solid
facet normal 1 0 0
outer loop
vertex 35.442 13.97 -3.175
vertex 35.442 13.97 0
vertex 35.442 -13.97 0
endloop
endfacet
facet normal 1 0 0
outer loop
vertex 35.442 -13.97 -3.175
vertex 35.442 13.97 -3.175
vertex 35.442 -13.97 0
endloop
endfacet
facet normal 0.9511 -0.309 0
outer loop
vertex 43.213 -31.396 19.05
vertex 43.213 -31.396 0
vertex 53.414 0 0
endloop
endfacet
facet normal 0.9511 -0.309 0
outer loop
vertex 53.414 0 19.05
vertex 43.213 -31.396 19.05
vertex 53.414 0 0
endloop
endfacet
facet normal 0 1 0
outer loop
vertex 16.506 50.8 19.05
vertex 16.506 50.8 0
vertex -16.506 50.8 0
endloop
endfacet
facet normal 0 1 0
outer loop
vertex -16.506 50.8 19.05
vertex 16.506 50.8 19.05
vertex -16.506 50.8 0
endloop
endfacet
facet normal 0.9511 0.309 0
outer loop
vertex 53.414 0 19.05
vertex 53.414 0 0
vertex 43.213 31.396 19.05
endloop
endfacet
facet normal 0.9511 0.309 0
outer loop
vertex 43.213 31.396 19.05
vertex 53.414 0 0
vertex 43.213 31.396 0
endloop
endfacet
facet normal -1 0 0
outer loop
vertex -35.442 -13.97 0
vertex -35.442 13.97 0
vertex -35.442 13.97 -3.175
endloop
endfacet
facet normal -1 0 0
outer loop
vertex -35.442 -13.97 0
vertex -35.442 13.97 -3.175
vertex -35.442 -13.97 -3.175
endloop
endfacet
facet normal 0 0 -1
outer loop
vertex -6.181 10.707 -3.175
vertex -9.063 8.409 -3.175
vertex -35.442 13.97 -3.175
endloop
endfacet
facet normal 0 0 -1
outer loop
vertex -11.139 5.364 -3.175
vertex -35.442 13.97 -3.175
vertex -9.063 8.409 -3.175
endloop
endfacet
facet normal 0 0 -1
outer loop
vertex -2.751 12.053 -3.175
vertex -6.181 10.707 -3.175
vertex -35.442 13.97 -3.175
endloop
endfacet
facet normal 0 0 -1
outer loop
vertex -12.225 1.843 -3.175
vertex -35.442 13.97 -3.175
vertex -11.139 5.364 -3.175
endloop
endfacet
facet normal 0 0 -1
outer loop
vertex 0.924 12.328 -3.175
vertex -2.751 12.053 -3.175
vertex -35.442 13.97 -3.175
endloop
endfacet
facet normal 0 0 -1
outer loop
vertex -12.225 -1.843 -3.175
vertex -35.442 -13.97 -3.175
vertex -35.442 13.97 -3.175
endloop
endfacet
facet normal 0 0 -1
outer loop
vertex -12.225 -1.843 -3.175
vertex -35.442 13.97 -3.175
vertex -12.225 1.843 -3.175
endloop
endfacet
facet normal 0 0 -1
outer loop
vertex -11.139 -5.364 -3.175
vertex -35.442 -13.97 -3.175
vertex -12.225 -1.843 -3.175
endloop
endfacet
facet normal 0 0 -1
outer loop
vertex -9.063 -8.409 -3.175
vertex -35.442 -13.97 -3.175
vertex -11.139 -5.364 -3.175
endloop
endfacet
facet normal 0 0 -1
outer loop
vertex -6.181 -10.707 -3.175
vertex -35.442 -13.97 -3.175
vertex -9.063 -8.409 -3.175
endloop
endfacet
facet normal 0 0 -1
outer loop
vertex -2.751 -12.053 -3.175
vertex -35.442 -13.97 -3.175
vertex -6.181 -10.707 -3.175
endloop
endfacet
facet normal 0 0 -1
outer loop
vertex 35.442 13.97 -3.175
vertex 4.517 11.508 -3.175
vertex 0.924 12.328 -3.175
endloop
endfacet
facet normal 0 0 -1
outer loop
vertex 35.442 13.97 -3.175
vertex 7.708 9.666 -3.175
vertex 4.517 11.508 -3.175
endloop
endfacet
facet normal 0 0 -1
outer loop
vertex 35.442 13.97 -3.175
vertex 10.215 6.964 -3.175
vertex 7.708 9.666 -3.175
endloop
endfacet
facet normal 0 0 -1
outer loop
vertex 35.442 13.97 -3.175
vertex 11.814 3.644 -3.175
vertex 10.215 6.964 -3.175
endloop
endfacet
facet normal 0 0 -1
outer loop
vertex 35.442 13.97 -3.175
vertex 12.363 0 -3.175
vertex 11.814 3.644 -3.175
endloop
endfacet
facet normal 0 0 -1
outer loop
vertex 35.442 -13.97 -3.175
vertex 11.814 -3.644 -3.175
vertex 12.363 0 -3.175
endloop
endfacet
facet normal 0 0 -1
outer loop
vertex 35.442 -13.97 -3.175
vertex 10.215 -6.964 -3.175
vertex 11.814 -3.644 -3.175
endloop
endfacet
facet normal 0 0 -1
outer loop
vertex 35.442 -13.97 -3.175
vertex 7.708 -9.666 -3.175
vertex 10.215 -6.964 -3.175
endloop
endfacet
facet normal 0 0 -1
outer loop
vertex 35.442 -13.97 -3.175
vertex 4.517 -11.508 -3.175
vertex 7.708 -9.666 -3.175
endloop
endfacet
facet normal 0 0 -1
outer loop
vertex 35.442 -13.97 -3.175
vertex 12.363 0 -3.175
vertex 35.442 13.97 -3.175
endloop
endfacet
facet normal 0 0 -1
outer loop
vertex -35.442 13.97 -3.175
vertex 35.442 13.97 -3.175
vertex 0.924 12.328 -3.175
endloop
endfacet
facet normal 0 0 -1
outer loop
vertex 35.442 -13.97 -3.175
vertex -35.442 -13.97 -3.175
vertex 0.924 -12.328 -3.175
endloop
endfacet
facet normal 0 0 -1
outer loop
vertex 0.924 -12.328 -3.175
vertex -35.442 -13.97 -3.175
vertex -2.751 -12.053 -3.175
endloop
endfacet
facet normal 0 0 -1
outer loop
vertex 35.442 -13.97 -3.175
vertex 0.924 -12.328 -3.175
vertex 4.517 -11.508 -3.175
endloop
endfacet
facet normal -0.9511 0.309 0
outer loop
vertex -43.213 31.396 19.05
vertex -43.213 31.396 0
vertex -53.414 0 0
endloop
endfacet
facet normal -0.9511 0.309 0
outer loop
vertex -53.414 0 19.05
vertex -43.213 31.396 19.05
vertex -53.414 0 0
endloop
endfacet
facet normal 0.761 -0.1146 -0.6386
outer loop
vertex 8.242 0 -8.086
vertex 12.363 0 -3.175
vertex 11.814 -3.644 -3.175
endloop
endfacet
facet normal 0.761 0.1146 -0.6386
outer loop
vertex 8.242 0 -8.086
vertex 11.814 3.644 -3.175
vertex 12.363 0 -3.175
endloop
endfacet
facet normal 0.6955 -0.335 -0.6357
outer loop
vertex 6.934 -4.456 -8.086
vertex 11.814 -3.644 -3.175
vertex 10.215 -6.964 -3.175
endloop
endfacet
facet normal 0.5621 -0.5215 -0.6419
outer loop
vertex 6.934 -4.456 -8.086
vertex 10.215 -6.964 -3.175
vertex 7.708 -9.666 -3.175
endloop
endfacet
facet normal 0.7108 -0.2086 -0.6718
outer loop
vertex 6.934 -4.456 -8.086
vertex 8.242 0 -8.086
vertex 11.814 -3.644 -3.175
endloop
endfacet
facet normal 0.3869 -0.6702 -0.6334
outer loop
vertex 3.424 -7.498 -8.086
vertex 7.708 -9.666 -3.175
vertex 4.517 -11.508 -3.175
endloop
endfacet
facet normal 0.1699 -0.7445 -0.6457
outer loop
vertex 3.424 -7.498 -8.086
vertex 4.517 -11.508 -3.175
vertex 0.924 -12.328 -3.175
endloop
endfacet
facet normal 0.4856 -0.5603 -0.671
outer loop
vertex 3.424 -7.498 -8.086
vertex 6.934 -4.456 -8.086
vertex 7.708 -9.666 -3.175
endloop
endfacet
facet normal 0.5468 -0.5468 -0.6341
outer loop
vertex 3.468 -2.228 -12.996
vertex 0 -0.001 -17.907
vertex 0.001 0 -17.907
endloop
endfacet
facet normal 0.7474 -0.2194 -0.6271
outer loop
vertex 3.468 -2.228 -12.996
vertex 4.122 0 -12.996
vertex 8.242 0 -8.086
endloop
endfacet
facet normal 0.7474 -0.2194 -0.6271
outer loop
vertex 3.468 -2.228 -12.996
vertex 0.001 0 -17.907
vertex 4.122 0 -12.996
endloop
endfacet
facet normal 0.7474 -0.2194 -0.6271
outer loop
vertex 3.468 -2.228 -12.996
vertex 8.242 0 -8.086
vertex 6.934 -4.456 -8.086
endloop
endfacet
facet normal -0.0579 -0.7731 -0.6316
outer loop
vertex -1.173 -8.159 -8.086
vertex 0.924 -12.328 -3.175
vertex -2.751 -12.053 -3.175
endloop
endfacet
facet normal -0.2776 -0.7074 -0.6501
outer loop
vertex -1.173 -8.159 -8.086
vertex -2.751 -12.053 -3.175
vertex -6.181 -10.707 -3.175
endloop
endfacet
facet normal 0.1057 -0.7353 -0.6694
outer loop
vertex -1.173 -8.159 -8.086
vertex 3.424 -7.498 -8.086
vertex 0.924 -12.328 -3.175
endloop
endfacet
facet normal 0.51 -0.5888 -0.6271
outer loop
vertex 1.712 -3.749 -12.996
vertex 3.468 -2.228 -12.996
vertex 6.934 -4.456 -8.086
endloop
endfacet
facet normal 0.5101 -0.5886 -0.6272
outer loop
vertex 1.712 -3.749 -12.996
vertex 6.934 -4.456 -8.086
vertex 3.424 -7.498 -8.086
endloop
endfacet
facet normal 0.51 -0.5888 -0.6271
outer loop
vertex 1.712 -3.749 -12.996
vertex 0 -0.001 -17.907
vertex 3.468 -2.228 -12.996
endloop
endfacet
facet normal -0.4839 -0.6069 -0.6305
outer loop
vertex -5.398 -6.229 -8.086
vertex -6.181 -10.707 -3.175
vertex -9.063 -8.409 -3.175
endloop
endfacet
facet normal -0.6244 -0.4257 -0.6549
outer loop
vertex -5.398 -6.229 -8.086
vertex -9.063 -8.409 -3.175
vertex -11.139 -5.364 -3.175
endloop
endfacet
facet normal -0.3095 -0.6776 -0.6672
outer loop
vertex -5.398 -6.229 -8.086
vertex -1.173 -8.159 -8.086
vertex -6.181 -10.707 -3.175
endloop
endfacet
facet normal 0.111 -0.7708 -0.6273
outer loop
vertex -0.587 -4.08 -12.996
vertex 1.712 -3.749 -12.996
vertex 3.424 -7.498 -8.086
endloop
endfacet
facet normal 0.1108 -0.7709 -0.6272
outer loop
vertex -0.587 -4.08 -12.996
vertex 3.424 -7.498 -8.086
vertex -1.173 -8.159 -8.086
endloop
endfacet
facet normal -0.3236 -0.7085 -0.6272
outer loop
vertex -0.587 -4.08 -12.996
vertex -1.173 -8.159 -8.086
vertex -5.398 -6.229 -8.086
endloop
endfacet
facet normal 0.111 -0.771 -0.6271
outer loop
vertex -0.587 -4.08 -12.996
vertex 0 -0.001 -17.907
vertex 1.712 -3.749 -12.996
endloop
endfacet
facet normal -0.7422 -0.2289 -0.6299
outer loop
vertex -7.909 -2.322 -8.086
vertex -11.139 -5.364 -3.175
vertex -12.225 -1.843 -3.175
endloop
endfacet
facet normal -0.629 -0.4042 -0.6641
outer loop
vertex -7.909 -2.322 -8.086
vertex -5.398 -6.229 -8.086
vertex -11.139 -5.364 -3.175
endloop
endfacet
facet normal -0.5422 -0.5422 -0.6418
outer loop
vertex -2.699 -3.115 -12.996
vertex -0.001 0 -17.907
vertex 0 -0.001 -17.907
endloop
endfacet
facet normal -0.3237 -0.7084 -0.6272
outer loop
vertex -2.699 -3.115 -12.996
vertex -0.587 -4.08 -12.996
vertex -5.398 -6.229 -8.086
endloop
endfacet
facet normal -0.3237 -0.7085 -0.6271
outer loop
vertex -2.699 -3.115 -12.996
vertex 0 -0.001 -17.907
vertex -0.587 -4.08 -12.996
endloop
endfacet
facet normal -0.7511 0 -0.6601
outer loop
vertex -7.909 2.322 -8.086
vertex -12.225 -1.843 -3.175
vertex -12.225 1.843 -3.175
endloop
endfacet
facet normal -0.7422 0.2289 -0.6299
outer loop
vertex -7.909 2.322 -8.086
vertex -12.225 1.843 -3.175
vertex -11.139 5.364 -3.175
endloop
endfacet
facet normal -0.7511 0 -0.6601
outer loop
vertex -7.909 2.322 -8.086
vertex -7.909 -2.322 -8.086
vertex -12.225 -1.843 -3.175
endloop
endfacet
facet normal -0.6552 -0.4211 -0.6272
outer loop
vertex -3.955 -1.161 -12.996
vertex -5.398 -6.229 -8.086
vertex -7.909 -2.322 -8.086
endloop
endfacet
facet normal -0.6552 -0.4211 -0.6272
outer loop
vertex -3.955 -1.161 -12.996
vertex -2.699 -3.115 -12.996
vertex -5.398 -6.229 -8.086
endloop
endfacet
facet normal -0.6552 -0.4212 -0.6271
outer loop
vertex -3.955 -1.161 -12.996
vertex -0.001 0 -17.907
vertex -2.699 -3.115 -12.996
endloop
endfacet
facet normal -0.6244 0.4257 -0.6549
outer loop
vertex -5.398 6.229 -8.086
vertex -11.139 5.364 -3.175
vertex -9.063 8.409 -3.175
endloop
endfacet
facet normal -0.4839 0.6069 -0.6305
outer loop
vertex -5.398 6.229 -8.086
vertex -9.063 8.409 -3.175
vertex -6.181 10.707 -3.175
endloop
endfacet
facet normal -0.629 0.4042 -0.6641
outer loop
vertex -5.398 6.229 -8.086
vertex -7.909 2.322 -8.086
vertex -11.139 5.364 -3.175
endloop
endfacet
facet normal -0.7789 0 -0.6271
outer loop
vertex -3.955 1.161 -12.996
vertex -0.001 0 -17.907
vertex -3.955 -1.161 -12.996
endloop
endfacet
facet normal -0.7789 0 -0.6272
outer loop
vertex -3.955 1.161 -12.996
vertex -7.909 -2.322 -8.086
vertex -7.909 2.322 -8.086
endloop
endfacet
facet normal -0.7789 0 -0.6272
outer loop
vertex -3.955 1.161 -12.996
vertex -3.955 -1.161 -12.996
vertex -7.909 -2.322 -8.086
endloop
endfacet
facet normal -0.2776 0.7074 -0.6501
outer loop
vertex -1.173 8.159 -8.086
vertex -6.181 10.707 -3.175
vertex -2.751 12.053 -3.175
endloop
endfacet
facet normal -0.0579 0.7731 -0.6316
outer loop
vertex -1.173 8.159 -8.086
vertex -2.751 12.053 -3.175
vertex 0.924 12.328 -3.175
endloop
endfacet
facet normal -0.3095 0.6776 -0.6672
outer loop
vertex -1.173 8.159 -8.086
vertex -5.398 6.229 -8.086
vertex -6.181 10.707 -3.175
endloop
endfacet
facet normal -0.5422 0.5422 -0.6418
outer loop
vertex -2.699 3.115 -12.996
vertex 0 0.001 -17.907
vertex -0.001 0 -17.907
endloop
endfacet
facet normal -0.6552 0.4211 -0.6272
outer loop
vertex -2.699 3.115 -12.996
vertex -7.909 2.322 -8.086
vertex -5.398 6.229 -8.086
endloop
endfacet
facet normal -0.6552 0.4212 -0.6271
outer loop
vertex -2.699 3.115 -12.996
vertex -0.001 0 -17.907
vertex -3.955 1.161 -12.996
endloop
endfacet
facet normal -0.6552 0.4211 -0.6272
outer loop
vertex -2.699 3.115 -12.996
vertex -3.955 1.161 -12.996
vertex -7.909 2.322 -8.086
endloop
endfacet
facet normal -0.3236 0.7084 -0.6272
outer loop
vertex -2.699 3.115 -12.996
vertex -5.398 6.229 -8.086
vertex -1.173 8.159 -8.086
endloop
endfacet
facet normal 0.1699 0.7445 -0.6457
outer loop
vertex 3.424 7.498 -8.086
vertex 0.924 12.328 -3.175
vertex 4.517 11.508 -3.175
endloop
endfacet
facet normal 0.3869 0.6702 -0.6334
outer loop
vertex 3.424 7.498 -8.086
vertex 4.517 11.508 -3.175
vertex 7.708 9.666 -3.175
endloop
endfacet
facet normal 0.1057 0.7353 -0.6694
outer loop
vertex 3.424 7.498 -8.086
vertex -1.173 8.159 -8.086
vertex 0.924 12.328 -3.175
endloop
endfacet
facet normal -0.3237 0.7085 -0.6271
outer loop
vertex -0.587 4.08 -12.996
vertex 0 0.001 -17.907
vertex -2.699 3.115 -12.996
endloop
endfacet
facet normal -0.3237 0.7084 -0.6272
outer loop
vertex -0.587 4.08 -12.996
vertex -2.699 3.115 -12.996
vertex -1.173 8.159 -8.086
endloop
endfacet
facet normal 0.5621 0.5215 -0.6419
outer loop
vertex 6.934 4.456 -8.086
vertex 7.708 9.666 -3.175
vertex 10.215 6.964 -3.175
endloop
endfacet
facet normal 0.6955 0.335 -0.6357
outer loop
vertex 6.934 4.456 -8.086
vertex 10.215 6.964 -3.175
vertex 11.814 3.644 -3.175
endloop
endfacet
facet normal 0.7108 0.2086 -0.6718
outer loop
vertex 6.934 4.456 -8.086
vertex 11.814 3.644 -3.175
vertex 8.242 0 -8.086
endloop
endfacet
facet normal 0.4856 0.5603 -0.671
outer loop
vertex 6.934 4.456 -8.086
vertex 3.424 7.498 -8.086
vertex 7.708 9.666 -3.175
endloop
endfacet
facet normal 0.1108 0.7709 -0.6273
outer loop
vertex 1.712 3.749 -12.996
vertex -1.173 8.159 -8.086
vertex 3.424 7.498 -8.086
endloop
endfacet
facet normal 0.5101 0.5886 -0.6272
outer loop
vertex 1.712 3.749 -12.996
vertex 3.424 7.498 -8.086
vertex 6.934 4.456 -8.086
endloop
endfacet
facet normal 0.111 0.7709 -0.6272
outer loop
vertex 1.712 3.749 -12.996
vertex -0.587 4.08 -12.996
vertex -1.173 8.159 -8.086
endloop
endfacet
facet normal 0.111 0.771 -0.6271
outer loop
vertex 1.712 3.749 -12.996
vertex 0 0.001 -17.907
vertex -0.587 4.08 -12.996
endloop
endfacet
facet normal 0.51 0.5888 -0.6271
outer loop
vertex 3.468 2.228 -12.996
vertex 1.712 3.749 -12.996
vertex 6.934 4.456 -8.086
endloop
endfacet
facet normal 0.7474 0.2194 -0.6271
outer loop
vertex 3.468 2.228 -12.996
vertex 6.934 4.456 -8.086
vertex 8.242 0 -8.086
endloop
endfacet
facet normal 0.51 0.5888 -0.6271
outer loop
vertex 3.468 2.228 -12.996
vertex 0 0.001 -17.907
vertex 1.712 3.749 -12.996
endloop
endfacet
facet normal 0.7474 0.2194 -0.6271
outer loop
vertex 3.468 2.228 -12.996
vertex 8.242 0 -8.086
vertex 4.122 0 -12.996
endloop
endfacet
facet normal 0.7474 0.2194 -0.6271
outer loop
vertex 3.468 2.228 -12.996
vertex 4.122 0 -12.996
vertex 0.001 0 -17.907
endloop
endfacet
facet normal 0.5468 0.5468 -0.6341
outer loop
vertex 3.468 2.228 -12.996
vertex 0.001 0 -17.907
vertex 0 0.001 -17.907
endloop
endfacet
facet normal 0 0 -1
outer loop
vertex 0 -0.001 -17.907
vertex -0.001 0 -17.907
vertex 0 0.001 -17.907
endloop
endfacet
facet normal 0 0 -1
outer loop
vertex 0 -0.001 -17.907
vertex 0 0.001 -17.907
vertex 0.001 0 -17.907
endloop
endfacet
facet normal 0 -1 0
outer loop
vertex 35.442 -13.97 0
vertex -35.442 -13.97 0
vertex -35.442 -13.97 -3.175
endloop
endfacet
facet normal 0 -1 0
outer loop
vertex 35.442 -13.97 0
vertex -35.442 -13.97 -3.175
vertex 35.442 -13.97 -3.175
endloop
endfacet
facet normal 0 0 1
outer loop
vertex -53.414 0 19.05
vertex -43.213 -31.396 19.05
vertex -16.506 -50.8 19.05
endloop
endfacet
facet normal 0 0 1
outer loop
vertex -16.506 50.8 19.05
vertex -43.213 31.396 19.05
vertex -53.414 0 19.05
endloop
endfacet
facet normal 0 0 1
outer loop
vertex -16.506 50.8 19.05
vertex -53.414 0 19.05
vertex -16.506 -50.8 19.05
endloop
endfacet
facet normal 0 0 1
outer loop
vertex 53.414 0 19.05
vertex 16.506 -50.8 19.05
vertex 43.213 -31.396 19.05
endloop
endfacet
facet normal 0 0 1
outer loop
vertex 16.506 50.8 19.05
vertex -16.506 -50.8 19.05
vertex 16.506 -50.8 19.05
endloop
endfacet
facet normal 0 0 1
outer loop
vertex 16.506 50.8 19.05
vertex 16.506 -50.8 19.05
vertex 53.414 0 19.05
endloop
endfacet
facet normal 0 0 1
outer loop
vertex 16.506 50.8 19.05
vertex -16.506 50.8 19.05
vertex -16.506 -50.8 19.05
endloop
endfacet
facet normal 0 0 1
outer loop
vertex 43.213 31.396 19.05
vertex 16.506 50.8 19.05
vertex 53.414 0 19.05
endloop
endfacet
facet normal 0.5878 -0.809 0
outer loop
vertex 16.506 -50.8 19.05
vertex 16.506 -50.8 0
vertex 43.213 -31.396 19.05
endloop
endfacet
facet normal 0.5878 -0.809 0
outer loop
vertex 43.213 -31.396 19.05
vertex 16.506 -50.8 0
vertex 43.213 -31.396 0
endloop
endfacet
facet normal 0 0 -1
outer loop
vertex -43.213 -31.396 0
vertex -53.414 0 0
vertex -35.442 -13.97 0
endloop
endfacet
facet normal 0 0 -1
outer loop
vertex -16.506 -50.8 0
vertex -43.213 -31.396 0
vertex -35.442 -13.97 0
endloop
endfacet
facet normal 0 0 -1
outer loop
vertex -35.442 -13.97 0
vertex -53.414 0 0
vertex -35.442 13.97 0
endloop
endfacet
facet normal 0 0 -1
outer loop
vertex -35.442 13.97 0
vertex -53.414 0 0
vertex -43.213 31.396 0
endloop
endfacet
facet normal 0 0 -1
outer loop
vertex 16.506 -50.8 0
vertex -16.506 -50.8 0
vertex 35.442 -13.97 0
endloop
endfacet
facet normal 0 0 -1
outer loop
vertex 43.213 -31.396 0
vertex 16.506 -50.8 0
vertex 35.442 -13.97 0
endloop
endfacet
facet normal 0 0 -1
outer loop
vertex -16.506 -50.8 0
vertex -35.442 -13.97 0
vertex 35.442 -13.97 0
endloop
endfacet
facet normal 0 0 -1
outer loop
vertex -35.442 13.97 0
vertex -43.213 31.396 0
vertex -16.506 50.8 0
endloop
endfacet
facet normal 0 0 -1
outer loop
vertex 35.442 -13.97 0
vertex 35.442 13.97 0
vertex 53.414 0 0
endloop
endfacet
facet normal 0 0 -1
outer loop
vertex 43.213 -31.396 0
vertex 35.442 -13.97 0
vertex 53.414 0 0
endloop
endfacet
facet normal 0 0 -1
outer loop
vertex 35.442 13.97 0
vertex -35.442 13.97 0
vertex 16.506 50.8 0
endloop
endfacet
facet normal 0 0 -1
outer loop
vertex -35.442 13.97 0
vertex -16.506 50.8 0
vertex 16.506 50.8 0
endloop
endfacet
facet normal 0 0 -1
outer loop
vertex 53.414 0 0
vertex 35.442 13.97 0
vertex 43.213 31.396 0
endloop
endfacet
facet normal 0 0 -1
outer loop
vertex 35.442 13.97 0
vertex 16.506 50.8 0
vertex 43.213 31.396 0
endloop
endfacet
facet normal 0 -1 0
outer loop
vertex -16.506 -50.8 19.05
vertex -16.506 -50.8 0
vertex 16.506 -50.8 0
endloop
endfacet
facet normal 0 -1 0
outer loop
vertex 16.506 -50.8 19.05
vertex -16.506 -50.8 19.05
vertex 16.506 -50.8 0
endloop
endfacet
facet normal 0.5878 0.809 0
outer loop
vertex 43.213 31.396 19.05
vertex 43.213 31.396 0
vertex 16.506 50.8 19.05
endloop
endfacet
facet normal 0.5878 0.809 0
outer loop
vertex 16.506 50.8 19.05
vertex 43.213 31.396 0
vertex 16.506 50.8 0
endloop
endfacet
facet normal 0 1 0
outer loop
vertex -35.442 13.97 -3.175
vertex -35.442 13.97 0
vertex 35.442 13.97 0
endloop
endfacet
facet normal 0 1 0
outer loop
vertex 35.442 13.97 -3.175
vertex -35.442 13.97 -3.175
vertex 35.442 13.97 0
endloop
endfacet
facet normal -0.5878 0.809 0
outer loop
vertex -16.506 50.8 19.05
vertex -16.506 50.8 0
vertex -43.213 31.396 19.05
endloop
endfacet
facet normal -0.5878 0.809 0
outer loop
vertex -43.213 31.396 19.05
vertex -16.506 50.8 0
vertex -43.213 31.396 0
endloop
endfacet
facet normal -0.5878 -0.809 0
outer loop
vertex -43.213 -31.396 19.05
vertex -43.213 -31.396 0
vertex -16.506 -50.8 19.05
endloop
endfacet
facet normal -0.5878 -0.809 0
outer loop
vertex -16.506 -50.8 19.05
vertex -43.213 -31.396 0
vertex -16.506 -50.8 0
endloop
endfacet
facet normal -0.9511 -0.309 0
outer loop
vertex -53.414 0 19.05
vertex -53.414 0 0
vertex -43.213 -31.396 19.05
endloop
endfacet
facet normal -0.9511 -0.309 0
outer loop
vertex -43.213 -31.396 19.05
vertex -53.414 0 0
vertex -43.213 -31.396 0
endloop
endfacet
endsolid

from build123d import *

# Parameters (mm, degrees)
F1_DEPTH = 19.05
F2_W     = 70.8835957375
F2_H     = 27.94
F3_DEPTH = 3.175
F4_R     = 12.6886346665
F5_DEPTH = 14.732


# Not quite as in the source:
# - a fillet or chamfer that OpenCascade refuses, or shapes differently, is made with other operations: its cross-section is extruded or revolved along the edge and cut away or added


with BuildPart() as f1:
    # F0 (on Top) → F1 (new body)
    with BuildSketch(Plane.XY):
        Polygon((-16.5059205686, -50.8), (16.5059205686, -50.8), (43.2130610643, -31.3961266285), (53.4142809913, 0), (43.2130610643, 31.3961266285), (16.5059205686, 50.8), (-16.5059205686, 50.8), (-43.2130610643, 31.3961266285), (-53.4142809913, 0), (-43.2130610643, -31.3961266285), align=None)
    extrude(amount=F1_DEPTH)

    # F2 (on face) → F3 (join)
    with BuildSketch(Plane(origin=(0, 0, 0), x_dir=(1, 0, 0), z_dir=(0, 0, -1))):
        Rectangle(F2_W, F2_H)
    extrude(amount=F3_DEPTH)

    # F4 (on face) → F5 (join)
    with BuildSketch(Plane(origin=(0, 0, -3.175), x_dir=(1, 0, 0), z_dir=(0, 0, -1))):
        Circle(F4_R)
    extrude(amount=F5_DEPTH)

    # F6: chamfer of 12.6873 x 15.1201353553 on 1 edges, made by hand


with BuildPart() as f6_tool2:
    # F6_s3 → F6_t4 (revolve)
    with BuildSketch(Plane.XZ):
        Polygon((12.6886346665, -2.7868646447), (0.0013346665, -17.907), (12.6886346665, -17.907), align=None)
    revolve(axis=Axis((0, 0, -17.907), (0, 0, -1)))

    split(bisect_by=Plane.XY.offset(-3.175), keep=Keep.BOTTOM)


with BuildPart() as f1_1:
    add(f1.part)

    # F6_t1: cut F6_tool2
    add(f6_tool2.part, mode=Mode.SUBTRACT)


solid = f1_1.part
